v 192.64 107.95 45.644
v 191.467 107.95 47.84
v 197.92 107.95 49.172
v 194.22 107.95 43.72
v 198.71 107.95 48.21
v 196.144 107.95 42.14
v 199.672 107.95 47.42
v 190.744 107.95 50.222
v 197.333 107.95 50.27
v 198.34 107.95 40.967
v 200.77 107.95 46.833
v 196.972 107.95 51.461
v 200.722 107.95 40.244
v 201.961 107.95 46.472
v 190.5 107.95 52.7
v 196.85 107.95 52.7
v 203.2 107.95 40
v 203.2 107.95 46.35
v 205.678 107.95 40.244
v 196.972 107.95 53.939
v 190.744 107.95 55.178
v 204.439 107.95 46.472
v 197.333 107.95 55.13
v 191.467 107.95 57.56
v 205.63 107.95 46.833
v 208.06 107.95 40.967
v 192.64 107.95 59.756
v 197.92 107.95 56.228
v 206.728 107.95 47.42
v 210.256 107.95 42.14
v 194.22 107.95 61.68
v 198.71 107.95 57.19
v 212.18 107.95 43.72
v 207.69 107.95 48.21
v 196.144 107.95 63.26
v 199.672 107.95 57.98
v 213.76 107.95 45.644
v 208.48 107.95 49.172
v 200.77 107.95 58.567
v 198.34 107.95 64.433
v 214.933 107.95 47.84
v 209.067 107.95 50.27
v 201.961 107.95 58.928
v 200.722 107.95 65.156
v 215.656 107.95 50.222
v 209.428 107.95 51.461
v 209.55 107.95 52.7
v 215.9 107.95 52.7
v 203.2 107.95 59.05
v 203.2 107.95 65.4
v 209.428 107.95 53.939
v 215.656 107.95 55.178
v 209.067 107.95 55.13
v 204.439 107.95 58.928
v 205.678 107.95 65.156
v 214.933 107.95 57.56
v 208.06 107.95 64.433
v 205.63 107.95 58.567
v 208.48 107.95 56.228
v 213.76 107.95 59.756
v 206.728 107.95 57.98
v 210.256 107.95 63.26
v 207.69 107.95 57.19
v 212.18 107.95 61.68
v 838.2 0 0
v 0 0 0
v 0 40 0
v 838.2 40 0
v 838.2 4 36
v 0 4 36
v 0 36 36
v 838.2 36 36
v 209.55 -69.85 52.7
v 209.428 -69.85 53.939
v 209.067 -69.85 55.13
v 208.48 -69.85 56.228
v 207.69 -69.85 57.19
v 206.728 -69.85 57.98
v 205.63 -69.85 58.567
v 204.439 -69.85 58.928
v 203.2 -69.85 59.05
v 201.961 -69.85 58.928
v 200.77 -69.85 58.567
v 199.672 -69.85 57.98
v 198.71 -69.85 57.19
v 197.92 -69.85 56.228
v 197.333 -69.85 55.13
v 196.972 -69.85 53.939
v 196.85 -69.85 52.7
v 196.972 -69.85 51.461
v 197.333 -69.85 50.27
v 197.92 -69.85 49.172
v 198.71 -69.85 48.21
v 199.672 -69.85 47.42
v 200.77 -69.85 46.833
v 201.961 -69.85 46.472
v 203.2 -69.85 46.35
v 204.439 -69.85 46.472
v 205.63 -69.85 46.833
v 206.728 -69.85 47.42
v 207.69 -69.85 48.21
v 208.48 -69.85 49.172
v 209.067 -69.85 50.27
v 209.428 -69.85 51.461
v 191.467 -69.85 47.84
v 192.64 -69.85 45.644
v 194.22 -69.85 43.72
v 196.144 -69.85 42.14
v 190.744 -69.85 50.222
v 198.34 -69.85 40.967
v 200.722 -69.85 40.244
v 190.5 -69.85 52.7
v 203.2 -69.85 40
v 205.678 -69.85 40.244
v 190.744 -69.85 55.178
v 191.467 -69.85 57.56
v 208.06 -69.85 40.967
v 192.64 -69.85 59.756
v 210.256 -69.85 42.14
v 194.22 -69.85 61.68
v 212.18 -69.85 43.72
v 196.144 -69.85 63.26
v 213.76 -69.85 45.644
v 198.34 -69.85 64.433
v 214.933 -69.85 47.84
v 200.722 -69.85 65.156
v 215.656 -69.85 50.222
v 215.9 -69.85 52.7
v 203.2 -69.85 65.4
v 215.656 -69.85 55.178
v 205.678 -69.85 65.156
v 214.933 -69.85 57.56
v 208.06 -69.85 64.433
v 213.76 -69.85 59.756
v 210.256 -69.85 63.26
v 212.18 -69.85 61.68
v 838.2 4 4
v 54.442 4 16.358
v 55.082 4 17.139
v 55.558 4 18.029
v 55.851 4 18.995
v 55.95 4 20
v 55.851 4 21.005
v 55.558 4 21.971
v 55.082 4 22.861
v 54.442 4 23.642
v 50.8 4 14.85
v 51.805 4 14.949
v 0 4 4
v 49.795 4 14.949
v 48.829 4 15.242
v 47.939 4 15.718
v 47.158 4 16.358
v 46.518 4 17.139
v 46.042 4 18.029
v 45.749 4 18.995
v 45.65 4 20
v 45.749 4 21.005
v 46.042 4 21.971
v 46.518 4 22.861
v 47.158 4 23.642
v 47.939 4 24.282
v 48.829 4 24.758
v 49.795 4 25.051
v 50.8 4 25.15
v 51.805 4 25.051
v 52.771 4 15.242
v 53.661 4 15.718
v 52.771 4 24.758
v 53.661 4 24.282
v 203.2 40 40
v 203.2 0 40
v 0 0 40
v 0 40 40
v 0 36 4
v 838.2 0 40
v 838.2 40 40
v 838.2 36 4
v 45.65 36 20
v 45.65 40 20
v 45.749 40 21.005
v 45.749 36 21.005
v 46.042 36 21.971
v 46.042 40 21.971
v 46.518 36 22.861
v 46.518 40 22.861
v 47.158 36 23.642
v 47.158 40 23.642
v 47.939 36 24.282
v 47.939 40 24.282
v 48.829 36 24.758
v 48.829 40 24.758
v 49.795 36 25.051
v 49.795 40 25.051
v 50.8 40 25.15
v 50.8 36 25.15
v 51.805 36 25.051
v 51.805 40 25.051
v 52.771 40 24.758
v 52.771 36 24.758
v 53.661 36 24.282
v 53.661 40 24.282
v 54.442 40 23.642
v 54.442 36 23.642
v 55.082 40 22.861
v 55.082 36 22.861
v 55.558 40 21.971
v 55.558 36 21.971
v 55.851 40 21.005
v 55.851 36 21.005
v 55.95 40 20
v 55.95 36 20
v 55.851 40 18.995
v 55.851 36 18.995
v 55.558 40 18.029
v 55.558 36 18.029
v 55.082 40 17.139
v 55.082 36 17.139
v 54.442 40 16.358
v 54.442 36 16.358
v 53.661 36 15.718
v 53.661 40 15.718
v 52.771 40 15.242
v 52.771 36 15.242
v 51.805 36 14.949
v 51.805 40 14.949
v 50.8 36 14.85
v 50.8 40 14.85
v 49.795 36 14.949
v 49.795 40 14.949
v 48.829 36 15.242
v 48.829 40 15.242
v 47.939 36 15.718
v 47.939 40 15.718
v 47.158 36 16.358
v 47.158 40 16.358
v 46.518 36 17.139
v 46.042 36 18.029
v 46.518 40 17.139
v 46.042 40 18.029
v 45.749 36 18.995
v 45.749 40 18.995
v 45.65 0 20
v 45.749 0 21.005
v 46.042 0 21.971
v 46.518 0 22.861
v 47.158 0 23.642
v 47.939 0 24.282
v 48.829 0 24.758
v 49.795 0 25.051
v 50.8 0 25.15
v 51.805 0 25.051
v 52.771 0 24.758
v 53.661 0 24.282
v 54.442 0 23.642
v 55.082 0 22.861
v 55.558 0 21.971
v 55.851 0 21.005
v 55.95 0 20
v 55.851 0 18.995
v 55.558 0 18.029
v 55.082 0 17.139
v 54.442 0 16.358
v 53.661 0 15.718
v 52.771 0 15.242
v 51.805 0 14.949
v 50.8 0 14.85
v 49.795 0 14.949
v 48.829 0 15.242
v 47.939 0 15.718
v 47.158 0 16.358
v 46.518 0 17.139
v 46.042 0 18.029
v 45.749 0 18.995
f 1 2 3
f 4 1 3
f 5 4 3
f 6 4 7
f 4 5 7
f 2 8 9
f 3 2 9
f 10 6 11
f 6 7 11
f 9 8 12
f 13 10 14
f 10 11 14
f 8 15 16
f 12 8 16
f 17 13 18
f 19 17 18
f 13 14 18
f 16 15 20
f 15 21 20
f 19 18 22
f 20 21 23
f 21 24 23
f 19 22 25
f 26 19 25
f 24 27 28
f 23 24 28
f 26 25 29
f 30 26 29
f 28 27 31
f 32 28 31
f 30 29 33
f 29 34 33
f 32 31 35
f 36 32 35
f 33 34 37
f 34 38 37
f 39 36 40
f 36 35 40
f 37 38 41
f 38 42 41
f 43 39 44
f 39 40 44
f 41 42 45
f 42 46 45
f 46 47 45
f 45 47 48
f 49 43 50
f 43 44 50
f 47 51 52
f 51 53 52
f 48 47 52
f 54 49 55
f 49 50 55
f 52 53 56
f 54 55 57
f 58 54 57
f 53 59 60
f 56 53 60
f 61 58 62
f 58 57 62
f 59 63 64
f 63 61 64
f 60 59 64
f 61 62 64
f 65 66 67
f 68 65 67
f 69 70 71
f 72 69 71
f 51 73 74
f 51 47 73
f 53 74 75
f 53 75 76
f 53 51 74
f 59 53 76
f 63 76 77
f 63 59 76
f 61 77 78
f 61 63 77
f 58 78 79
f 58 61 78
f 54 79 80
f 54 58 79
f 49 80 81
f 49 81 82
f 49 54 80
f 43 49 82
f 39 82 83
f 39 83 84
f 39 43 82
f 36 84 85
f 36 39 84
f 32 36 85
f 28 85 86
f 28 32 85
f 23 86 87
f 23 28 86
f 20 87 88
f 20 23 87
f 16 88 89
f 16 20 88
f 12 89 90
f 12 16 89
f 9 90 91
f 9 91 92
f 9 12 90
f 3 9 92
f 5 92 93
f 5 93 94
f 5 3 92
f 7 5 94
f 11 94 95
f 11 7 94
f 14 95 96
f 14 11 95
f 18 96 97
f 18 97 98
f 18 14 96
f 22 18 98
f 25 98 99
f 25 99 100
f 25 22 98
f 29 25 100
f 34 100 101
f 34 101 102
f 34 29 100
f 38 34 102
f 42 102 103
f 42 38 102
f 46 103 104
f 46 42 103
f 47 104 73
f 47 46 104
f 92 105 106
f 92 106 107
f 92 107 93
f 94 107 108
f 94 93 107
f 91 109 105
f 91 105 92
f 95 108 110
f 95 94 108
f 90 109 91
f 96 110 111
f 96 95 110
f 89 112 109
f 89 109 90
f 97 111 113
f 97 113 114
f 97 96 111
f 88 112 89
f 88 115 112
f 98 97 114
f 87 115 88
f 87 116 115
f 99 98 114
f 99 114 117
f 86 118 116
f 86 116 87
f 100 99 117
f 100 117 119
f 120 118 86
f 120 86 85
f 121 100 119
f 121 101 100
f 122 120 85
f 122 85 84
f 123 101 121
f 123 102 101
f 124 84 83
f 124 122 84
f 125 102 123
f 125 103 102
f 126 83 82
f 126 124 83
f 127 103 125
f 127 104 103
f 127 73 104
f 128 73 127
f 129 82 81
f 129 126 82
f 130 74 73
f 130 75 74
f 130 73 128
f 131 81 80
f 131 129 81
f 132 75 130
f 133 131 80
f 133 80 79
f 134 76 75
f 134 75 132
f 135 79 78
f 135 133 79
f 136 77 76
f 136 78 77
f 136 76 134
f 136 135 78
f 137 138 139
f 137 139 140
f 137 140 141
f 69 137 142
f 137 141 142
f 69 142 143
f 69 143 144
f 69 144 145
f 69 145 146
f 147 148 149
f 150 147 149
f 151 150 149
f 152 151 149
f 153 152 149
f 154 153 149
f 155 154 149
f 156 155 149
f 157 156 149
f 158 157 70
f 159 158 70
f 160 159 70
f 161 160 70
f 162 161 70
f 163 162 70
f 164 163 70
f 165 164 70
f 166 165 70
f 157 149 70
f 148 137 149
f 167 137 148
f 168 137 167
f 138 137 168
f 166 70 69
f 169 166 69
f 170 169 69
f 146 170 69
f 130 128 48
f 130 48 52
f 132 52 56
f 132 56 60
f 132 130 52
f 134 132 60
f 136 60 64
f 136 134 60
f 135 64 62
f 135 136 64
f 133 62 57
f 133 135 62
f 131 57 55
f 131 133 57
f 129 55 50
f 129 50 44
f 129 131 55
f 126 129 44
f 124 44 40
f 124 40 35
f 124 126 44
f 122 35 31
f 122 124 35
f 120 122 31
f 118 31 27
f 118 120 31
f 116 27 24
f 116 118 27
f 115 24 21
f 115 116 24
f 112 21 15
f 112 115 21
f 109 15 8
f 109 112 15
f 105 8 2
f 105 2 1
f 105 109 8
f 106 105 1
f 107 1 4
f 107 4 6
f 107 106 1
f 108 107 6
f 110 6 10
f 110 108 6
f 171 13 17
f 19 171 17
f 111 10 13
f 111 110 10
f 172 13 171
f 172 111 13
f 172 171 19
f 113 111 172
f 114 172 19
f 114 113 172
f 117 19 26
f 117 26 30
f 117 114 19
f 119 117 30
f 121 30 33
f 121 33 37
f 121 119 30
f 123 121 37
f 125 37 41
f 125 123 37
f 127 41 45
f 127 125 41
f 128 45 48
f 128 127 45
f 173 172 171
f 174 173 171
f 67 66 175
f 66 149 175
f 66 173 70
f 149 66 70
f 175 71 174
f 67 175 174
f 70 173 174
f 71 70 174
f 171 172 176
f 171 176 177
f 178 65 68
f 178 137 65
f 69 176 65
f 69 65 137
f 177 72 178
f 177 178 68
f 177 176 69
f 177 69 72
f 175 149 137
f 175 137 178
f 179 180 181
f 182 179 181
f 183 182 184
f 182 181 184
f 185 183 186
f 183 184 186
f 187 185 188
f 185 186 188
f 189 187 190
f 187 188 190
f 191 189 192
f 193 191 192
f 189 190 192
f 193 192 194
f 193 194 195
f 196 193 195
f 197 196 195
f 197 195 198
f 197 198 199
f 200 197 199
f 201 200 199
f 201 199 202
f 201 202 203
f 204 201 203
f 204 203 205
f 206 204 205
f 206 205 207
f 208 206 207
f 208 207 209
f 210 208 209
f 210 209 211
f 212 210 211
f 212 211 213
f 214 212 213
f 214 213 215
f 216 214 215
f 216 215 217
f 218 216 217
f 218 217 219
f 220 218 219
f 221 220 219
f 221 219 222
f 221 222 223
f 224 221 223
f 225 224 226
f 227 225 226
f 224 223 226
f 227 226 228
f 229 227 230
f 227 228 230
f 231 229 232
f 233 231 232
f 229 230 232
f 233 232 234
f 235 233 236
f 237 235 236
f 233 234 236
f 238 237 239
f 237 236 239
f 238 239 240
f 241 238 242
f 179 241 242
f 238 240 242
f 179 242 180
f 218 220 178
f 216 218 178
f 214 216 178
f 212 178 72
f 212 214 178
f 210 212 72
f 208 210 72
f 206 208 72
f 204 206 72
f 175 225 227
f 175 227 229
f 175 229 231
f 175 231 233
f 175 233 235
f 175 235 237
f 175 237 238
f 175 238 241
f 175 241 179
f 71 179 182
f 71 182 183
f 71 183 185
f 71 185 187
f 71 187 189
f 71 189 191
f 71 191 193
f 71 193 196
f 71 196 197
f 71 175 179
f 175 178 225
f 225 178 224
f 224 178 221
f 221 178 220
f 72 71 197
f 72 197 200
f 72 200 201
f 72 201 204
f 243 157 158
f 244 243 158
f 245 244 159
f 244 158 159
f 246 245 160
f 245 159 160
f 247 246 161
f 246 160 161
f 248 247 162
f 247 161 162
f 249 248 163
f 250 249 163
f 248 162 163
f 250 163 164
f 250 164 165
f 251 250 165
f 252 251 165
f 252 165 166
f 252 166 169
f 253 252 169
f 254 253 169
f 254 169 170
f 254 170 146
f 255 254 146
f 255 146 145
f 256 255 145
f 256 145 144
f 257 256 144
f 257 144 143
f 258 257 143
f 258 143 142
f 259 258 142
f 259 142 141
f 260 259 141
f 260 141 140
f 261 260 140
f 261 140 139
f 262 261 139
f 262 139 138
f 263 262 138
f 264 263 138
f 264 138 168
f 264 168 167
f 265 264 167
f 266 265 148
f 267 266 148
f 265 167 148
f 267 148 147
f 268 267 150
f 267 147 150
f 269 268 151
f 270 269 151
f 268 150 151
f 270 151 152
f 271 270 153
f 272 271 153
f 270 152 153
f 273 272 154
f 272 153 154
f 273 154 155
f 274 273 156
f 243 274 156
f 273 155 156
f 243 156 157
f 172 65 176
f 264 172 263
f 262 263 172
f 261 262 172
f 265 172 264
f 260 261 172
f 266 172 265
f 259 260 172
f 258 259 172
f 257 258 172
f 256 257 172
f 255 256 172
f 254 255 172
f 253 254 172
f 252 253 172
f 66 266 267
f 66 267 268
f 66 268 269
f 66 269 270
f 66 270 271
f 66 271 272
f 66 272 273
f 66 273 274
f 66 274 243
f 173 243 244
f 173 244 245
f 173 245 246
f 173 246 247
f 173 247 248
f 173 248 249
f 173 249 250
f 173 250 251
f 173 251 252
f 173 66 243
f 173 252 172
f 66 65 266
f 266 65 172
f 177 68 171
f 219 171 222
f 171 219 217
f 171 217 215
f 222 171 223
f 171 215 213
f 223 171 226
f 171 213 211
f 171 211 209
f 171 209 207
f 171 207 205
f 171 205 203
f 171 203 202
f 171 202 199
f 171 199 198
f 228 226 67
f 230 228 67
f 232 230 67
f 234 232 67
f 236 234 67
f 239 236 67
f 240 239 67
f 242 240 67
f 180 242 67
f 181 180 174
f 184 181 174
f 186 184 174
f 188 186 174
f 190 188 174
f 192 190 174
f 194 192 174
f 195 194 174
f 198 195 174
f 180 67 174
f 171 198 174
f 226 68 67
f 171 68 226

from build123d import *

# Parameters (mm, degrees)
F0_W     = 40
F0_H     = 40
F0_W_2   = 32
F0_H_2   = 32
F1_DEPTH = 838.2
F4_D     = 10.3
F5_R     = 12.7
F5_R_2   = 6.35
F6_DEPTH = 88.9


with BuildPart() as f1:
    # F0 (on Right) → F1 (new body)
    with BuildSketch(Plane.YZ):
        with Locations((20, 20)):
            Rectangle(F0_W, F0_H)
        with Locations((20, 20)):
            Rectangle(F0_W_2, F0_H_2, mode=Mode.SUBTRACT)
    extrude(amount=F1_DEPTH)

    # F4 (through all)
    with Locations(Plane.XZ):
        with Locations((50.8, 20)):
            Hole(F4_D / 2)

    # F5 (on offset) → F6 (join, symmetric)
    with BuildSketch(Plane.XZ.offset(-19.05)):
        with Locations((203.2, 52.7)):
            Circle(F5_R)
        with Locations((203.2, 52.7)):
            Circle(F5_R_2, mode=Mode.SUBTRACT)
    extrude(amount=F6_DEPTH, both=True)


solid = f1.part
